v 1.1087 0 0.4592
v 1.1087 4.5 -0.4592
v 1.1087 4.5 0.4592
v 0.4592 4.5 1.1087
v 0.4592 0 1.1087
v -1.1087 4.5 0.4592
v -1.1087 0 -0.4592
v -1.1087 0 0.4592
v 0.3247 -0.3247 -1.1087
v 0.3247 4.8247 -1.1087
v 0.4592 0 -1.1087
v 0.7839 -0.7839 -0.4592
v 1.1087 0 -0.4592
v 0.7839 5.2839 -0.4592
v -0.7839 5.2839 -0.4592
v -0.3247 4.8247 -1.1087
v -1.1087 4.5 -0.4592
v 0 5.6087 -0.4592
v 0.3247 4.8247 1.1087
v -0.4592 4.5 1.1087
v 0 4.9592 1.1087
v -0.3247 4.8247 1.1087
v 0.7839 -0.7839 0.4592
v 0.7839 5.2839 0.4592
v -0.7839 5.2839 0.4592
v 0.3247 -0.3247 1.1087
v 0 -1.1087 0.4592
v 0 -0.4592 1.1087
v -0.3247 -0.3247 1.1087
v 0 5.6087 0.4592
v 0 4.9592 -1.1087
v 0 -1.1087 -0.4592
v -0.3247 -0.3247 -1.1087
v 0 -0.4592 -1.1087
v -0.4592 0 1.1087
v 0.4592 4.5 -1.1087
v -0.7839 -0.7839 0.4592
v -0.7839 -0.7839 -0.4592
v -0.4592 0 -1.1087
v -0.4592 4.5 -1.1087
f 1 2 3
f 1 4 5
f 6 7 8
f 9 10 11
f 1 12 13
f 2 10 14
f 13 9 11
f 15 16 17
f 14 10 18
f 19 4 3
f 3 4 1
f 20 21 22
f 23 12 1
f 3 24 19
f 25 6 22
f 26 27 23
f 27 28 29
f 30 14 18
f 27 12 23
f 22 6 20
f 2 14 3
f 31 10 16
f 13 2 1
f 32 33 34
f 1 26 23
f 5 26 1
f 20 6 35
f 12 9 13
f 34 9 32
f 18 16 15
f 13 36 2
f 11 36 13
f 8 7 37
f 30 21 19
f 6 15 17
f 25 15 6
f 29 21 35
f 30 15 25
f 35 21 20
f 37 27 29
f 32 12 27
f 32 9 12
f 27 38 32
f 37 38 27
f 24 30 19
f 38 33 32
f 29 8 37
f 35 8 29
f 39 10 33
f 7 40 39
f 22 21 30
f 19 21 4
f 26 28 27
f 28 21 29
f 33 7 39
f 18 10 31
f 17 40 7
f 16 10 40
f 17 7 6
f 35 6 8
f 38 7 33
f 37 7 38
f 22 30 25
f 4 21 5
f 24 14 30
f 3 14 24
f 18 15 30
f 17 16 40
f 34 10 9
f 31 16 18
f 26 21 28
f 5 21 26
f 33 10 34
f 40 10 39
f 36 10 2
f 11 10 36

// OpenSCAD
module rod(a, b, r) {
        hull() {
            translate(a) sphere(r,$fn=8);
            translate(b) sphere(r,$fn=8);
        }
    }

rod([0,0,0],[0,4.5,0],1.2);
